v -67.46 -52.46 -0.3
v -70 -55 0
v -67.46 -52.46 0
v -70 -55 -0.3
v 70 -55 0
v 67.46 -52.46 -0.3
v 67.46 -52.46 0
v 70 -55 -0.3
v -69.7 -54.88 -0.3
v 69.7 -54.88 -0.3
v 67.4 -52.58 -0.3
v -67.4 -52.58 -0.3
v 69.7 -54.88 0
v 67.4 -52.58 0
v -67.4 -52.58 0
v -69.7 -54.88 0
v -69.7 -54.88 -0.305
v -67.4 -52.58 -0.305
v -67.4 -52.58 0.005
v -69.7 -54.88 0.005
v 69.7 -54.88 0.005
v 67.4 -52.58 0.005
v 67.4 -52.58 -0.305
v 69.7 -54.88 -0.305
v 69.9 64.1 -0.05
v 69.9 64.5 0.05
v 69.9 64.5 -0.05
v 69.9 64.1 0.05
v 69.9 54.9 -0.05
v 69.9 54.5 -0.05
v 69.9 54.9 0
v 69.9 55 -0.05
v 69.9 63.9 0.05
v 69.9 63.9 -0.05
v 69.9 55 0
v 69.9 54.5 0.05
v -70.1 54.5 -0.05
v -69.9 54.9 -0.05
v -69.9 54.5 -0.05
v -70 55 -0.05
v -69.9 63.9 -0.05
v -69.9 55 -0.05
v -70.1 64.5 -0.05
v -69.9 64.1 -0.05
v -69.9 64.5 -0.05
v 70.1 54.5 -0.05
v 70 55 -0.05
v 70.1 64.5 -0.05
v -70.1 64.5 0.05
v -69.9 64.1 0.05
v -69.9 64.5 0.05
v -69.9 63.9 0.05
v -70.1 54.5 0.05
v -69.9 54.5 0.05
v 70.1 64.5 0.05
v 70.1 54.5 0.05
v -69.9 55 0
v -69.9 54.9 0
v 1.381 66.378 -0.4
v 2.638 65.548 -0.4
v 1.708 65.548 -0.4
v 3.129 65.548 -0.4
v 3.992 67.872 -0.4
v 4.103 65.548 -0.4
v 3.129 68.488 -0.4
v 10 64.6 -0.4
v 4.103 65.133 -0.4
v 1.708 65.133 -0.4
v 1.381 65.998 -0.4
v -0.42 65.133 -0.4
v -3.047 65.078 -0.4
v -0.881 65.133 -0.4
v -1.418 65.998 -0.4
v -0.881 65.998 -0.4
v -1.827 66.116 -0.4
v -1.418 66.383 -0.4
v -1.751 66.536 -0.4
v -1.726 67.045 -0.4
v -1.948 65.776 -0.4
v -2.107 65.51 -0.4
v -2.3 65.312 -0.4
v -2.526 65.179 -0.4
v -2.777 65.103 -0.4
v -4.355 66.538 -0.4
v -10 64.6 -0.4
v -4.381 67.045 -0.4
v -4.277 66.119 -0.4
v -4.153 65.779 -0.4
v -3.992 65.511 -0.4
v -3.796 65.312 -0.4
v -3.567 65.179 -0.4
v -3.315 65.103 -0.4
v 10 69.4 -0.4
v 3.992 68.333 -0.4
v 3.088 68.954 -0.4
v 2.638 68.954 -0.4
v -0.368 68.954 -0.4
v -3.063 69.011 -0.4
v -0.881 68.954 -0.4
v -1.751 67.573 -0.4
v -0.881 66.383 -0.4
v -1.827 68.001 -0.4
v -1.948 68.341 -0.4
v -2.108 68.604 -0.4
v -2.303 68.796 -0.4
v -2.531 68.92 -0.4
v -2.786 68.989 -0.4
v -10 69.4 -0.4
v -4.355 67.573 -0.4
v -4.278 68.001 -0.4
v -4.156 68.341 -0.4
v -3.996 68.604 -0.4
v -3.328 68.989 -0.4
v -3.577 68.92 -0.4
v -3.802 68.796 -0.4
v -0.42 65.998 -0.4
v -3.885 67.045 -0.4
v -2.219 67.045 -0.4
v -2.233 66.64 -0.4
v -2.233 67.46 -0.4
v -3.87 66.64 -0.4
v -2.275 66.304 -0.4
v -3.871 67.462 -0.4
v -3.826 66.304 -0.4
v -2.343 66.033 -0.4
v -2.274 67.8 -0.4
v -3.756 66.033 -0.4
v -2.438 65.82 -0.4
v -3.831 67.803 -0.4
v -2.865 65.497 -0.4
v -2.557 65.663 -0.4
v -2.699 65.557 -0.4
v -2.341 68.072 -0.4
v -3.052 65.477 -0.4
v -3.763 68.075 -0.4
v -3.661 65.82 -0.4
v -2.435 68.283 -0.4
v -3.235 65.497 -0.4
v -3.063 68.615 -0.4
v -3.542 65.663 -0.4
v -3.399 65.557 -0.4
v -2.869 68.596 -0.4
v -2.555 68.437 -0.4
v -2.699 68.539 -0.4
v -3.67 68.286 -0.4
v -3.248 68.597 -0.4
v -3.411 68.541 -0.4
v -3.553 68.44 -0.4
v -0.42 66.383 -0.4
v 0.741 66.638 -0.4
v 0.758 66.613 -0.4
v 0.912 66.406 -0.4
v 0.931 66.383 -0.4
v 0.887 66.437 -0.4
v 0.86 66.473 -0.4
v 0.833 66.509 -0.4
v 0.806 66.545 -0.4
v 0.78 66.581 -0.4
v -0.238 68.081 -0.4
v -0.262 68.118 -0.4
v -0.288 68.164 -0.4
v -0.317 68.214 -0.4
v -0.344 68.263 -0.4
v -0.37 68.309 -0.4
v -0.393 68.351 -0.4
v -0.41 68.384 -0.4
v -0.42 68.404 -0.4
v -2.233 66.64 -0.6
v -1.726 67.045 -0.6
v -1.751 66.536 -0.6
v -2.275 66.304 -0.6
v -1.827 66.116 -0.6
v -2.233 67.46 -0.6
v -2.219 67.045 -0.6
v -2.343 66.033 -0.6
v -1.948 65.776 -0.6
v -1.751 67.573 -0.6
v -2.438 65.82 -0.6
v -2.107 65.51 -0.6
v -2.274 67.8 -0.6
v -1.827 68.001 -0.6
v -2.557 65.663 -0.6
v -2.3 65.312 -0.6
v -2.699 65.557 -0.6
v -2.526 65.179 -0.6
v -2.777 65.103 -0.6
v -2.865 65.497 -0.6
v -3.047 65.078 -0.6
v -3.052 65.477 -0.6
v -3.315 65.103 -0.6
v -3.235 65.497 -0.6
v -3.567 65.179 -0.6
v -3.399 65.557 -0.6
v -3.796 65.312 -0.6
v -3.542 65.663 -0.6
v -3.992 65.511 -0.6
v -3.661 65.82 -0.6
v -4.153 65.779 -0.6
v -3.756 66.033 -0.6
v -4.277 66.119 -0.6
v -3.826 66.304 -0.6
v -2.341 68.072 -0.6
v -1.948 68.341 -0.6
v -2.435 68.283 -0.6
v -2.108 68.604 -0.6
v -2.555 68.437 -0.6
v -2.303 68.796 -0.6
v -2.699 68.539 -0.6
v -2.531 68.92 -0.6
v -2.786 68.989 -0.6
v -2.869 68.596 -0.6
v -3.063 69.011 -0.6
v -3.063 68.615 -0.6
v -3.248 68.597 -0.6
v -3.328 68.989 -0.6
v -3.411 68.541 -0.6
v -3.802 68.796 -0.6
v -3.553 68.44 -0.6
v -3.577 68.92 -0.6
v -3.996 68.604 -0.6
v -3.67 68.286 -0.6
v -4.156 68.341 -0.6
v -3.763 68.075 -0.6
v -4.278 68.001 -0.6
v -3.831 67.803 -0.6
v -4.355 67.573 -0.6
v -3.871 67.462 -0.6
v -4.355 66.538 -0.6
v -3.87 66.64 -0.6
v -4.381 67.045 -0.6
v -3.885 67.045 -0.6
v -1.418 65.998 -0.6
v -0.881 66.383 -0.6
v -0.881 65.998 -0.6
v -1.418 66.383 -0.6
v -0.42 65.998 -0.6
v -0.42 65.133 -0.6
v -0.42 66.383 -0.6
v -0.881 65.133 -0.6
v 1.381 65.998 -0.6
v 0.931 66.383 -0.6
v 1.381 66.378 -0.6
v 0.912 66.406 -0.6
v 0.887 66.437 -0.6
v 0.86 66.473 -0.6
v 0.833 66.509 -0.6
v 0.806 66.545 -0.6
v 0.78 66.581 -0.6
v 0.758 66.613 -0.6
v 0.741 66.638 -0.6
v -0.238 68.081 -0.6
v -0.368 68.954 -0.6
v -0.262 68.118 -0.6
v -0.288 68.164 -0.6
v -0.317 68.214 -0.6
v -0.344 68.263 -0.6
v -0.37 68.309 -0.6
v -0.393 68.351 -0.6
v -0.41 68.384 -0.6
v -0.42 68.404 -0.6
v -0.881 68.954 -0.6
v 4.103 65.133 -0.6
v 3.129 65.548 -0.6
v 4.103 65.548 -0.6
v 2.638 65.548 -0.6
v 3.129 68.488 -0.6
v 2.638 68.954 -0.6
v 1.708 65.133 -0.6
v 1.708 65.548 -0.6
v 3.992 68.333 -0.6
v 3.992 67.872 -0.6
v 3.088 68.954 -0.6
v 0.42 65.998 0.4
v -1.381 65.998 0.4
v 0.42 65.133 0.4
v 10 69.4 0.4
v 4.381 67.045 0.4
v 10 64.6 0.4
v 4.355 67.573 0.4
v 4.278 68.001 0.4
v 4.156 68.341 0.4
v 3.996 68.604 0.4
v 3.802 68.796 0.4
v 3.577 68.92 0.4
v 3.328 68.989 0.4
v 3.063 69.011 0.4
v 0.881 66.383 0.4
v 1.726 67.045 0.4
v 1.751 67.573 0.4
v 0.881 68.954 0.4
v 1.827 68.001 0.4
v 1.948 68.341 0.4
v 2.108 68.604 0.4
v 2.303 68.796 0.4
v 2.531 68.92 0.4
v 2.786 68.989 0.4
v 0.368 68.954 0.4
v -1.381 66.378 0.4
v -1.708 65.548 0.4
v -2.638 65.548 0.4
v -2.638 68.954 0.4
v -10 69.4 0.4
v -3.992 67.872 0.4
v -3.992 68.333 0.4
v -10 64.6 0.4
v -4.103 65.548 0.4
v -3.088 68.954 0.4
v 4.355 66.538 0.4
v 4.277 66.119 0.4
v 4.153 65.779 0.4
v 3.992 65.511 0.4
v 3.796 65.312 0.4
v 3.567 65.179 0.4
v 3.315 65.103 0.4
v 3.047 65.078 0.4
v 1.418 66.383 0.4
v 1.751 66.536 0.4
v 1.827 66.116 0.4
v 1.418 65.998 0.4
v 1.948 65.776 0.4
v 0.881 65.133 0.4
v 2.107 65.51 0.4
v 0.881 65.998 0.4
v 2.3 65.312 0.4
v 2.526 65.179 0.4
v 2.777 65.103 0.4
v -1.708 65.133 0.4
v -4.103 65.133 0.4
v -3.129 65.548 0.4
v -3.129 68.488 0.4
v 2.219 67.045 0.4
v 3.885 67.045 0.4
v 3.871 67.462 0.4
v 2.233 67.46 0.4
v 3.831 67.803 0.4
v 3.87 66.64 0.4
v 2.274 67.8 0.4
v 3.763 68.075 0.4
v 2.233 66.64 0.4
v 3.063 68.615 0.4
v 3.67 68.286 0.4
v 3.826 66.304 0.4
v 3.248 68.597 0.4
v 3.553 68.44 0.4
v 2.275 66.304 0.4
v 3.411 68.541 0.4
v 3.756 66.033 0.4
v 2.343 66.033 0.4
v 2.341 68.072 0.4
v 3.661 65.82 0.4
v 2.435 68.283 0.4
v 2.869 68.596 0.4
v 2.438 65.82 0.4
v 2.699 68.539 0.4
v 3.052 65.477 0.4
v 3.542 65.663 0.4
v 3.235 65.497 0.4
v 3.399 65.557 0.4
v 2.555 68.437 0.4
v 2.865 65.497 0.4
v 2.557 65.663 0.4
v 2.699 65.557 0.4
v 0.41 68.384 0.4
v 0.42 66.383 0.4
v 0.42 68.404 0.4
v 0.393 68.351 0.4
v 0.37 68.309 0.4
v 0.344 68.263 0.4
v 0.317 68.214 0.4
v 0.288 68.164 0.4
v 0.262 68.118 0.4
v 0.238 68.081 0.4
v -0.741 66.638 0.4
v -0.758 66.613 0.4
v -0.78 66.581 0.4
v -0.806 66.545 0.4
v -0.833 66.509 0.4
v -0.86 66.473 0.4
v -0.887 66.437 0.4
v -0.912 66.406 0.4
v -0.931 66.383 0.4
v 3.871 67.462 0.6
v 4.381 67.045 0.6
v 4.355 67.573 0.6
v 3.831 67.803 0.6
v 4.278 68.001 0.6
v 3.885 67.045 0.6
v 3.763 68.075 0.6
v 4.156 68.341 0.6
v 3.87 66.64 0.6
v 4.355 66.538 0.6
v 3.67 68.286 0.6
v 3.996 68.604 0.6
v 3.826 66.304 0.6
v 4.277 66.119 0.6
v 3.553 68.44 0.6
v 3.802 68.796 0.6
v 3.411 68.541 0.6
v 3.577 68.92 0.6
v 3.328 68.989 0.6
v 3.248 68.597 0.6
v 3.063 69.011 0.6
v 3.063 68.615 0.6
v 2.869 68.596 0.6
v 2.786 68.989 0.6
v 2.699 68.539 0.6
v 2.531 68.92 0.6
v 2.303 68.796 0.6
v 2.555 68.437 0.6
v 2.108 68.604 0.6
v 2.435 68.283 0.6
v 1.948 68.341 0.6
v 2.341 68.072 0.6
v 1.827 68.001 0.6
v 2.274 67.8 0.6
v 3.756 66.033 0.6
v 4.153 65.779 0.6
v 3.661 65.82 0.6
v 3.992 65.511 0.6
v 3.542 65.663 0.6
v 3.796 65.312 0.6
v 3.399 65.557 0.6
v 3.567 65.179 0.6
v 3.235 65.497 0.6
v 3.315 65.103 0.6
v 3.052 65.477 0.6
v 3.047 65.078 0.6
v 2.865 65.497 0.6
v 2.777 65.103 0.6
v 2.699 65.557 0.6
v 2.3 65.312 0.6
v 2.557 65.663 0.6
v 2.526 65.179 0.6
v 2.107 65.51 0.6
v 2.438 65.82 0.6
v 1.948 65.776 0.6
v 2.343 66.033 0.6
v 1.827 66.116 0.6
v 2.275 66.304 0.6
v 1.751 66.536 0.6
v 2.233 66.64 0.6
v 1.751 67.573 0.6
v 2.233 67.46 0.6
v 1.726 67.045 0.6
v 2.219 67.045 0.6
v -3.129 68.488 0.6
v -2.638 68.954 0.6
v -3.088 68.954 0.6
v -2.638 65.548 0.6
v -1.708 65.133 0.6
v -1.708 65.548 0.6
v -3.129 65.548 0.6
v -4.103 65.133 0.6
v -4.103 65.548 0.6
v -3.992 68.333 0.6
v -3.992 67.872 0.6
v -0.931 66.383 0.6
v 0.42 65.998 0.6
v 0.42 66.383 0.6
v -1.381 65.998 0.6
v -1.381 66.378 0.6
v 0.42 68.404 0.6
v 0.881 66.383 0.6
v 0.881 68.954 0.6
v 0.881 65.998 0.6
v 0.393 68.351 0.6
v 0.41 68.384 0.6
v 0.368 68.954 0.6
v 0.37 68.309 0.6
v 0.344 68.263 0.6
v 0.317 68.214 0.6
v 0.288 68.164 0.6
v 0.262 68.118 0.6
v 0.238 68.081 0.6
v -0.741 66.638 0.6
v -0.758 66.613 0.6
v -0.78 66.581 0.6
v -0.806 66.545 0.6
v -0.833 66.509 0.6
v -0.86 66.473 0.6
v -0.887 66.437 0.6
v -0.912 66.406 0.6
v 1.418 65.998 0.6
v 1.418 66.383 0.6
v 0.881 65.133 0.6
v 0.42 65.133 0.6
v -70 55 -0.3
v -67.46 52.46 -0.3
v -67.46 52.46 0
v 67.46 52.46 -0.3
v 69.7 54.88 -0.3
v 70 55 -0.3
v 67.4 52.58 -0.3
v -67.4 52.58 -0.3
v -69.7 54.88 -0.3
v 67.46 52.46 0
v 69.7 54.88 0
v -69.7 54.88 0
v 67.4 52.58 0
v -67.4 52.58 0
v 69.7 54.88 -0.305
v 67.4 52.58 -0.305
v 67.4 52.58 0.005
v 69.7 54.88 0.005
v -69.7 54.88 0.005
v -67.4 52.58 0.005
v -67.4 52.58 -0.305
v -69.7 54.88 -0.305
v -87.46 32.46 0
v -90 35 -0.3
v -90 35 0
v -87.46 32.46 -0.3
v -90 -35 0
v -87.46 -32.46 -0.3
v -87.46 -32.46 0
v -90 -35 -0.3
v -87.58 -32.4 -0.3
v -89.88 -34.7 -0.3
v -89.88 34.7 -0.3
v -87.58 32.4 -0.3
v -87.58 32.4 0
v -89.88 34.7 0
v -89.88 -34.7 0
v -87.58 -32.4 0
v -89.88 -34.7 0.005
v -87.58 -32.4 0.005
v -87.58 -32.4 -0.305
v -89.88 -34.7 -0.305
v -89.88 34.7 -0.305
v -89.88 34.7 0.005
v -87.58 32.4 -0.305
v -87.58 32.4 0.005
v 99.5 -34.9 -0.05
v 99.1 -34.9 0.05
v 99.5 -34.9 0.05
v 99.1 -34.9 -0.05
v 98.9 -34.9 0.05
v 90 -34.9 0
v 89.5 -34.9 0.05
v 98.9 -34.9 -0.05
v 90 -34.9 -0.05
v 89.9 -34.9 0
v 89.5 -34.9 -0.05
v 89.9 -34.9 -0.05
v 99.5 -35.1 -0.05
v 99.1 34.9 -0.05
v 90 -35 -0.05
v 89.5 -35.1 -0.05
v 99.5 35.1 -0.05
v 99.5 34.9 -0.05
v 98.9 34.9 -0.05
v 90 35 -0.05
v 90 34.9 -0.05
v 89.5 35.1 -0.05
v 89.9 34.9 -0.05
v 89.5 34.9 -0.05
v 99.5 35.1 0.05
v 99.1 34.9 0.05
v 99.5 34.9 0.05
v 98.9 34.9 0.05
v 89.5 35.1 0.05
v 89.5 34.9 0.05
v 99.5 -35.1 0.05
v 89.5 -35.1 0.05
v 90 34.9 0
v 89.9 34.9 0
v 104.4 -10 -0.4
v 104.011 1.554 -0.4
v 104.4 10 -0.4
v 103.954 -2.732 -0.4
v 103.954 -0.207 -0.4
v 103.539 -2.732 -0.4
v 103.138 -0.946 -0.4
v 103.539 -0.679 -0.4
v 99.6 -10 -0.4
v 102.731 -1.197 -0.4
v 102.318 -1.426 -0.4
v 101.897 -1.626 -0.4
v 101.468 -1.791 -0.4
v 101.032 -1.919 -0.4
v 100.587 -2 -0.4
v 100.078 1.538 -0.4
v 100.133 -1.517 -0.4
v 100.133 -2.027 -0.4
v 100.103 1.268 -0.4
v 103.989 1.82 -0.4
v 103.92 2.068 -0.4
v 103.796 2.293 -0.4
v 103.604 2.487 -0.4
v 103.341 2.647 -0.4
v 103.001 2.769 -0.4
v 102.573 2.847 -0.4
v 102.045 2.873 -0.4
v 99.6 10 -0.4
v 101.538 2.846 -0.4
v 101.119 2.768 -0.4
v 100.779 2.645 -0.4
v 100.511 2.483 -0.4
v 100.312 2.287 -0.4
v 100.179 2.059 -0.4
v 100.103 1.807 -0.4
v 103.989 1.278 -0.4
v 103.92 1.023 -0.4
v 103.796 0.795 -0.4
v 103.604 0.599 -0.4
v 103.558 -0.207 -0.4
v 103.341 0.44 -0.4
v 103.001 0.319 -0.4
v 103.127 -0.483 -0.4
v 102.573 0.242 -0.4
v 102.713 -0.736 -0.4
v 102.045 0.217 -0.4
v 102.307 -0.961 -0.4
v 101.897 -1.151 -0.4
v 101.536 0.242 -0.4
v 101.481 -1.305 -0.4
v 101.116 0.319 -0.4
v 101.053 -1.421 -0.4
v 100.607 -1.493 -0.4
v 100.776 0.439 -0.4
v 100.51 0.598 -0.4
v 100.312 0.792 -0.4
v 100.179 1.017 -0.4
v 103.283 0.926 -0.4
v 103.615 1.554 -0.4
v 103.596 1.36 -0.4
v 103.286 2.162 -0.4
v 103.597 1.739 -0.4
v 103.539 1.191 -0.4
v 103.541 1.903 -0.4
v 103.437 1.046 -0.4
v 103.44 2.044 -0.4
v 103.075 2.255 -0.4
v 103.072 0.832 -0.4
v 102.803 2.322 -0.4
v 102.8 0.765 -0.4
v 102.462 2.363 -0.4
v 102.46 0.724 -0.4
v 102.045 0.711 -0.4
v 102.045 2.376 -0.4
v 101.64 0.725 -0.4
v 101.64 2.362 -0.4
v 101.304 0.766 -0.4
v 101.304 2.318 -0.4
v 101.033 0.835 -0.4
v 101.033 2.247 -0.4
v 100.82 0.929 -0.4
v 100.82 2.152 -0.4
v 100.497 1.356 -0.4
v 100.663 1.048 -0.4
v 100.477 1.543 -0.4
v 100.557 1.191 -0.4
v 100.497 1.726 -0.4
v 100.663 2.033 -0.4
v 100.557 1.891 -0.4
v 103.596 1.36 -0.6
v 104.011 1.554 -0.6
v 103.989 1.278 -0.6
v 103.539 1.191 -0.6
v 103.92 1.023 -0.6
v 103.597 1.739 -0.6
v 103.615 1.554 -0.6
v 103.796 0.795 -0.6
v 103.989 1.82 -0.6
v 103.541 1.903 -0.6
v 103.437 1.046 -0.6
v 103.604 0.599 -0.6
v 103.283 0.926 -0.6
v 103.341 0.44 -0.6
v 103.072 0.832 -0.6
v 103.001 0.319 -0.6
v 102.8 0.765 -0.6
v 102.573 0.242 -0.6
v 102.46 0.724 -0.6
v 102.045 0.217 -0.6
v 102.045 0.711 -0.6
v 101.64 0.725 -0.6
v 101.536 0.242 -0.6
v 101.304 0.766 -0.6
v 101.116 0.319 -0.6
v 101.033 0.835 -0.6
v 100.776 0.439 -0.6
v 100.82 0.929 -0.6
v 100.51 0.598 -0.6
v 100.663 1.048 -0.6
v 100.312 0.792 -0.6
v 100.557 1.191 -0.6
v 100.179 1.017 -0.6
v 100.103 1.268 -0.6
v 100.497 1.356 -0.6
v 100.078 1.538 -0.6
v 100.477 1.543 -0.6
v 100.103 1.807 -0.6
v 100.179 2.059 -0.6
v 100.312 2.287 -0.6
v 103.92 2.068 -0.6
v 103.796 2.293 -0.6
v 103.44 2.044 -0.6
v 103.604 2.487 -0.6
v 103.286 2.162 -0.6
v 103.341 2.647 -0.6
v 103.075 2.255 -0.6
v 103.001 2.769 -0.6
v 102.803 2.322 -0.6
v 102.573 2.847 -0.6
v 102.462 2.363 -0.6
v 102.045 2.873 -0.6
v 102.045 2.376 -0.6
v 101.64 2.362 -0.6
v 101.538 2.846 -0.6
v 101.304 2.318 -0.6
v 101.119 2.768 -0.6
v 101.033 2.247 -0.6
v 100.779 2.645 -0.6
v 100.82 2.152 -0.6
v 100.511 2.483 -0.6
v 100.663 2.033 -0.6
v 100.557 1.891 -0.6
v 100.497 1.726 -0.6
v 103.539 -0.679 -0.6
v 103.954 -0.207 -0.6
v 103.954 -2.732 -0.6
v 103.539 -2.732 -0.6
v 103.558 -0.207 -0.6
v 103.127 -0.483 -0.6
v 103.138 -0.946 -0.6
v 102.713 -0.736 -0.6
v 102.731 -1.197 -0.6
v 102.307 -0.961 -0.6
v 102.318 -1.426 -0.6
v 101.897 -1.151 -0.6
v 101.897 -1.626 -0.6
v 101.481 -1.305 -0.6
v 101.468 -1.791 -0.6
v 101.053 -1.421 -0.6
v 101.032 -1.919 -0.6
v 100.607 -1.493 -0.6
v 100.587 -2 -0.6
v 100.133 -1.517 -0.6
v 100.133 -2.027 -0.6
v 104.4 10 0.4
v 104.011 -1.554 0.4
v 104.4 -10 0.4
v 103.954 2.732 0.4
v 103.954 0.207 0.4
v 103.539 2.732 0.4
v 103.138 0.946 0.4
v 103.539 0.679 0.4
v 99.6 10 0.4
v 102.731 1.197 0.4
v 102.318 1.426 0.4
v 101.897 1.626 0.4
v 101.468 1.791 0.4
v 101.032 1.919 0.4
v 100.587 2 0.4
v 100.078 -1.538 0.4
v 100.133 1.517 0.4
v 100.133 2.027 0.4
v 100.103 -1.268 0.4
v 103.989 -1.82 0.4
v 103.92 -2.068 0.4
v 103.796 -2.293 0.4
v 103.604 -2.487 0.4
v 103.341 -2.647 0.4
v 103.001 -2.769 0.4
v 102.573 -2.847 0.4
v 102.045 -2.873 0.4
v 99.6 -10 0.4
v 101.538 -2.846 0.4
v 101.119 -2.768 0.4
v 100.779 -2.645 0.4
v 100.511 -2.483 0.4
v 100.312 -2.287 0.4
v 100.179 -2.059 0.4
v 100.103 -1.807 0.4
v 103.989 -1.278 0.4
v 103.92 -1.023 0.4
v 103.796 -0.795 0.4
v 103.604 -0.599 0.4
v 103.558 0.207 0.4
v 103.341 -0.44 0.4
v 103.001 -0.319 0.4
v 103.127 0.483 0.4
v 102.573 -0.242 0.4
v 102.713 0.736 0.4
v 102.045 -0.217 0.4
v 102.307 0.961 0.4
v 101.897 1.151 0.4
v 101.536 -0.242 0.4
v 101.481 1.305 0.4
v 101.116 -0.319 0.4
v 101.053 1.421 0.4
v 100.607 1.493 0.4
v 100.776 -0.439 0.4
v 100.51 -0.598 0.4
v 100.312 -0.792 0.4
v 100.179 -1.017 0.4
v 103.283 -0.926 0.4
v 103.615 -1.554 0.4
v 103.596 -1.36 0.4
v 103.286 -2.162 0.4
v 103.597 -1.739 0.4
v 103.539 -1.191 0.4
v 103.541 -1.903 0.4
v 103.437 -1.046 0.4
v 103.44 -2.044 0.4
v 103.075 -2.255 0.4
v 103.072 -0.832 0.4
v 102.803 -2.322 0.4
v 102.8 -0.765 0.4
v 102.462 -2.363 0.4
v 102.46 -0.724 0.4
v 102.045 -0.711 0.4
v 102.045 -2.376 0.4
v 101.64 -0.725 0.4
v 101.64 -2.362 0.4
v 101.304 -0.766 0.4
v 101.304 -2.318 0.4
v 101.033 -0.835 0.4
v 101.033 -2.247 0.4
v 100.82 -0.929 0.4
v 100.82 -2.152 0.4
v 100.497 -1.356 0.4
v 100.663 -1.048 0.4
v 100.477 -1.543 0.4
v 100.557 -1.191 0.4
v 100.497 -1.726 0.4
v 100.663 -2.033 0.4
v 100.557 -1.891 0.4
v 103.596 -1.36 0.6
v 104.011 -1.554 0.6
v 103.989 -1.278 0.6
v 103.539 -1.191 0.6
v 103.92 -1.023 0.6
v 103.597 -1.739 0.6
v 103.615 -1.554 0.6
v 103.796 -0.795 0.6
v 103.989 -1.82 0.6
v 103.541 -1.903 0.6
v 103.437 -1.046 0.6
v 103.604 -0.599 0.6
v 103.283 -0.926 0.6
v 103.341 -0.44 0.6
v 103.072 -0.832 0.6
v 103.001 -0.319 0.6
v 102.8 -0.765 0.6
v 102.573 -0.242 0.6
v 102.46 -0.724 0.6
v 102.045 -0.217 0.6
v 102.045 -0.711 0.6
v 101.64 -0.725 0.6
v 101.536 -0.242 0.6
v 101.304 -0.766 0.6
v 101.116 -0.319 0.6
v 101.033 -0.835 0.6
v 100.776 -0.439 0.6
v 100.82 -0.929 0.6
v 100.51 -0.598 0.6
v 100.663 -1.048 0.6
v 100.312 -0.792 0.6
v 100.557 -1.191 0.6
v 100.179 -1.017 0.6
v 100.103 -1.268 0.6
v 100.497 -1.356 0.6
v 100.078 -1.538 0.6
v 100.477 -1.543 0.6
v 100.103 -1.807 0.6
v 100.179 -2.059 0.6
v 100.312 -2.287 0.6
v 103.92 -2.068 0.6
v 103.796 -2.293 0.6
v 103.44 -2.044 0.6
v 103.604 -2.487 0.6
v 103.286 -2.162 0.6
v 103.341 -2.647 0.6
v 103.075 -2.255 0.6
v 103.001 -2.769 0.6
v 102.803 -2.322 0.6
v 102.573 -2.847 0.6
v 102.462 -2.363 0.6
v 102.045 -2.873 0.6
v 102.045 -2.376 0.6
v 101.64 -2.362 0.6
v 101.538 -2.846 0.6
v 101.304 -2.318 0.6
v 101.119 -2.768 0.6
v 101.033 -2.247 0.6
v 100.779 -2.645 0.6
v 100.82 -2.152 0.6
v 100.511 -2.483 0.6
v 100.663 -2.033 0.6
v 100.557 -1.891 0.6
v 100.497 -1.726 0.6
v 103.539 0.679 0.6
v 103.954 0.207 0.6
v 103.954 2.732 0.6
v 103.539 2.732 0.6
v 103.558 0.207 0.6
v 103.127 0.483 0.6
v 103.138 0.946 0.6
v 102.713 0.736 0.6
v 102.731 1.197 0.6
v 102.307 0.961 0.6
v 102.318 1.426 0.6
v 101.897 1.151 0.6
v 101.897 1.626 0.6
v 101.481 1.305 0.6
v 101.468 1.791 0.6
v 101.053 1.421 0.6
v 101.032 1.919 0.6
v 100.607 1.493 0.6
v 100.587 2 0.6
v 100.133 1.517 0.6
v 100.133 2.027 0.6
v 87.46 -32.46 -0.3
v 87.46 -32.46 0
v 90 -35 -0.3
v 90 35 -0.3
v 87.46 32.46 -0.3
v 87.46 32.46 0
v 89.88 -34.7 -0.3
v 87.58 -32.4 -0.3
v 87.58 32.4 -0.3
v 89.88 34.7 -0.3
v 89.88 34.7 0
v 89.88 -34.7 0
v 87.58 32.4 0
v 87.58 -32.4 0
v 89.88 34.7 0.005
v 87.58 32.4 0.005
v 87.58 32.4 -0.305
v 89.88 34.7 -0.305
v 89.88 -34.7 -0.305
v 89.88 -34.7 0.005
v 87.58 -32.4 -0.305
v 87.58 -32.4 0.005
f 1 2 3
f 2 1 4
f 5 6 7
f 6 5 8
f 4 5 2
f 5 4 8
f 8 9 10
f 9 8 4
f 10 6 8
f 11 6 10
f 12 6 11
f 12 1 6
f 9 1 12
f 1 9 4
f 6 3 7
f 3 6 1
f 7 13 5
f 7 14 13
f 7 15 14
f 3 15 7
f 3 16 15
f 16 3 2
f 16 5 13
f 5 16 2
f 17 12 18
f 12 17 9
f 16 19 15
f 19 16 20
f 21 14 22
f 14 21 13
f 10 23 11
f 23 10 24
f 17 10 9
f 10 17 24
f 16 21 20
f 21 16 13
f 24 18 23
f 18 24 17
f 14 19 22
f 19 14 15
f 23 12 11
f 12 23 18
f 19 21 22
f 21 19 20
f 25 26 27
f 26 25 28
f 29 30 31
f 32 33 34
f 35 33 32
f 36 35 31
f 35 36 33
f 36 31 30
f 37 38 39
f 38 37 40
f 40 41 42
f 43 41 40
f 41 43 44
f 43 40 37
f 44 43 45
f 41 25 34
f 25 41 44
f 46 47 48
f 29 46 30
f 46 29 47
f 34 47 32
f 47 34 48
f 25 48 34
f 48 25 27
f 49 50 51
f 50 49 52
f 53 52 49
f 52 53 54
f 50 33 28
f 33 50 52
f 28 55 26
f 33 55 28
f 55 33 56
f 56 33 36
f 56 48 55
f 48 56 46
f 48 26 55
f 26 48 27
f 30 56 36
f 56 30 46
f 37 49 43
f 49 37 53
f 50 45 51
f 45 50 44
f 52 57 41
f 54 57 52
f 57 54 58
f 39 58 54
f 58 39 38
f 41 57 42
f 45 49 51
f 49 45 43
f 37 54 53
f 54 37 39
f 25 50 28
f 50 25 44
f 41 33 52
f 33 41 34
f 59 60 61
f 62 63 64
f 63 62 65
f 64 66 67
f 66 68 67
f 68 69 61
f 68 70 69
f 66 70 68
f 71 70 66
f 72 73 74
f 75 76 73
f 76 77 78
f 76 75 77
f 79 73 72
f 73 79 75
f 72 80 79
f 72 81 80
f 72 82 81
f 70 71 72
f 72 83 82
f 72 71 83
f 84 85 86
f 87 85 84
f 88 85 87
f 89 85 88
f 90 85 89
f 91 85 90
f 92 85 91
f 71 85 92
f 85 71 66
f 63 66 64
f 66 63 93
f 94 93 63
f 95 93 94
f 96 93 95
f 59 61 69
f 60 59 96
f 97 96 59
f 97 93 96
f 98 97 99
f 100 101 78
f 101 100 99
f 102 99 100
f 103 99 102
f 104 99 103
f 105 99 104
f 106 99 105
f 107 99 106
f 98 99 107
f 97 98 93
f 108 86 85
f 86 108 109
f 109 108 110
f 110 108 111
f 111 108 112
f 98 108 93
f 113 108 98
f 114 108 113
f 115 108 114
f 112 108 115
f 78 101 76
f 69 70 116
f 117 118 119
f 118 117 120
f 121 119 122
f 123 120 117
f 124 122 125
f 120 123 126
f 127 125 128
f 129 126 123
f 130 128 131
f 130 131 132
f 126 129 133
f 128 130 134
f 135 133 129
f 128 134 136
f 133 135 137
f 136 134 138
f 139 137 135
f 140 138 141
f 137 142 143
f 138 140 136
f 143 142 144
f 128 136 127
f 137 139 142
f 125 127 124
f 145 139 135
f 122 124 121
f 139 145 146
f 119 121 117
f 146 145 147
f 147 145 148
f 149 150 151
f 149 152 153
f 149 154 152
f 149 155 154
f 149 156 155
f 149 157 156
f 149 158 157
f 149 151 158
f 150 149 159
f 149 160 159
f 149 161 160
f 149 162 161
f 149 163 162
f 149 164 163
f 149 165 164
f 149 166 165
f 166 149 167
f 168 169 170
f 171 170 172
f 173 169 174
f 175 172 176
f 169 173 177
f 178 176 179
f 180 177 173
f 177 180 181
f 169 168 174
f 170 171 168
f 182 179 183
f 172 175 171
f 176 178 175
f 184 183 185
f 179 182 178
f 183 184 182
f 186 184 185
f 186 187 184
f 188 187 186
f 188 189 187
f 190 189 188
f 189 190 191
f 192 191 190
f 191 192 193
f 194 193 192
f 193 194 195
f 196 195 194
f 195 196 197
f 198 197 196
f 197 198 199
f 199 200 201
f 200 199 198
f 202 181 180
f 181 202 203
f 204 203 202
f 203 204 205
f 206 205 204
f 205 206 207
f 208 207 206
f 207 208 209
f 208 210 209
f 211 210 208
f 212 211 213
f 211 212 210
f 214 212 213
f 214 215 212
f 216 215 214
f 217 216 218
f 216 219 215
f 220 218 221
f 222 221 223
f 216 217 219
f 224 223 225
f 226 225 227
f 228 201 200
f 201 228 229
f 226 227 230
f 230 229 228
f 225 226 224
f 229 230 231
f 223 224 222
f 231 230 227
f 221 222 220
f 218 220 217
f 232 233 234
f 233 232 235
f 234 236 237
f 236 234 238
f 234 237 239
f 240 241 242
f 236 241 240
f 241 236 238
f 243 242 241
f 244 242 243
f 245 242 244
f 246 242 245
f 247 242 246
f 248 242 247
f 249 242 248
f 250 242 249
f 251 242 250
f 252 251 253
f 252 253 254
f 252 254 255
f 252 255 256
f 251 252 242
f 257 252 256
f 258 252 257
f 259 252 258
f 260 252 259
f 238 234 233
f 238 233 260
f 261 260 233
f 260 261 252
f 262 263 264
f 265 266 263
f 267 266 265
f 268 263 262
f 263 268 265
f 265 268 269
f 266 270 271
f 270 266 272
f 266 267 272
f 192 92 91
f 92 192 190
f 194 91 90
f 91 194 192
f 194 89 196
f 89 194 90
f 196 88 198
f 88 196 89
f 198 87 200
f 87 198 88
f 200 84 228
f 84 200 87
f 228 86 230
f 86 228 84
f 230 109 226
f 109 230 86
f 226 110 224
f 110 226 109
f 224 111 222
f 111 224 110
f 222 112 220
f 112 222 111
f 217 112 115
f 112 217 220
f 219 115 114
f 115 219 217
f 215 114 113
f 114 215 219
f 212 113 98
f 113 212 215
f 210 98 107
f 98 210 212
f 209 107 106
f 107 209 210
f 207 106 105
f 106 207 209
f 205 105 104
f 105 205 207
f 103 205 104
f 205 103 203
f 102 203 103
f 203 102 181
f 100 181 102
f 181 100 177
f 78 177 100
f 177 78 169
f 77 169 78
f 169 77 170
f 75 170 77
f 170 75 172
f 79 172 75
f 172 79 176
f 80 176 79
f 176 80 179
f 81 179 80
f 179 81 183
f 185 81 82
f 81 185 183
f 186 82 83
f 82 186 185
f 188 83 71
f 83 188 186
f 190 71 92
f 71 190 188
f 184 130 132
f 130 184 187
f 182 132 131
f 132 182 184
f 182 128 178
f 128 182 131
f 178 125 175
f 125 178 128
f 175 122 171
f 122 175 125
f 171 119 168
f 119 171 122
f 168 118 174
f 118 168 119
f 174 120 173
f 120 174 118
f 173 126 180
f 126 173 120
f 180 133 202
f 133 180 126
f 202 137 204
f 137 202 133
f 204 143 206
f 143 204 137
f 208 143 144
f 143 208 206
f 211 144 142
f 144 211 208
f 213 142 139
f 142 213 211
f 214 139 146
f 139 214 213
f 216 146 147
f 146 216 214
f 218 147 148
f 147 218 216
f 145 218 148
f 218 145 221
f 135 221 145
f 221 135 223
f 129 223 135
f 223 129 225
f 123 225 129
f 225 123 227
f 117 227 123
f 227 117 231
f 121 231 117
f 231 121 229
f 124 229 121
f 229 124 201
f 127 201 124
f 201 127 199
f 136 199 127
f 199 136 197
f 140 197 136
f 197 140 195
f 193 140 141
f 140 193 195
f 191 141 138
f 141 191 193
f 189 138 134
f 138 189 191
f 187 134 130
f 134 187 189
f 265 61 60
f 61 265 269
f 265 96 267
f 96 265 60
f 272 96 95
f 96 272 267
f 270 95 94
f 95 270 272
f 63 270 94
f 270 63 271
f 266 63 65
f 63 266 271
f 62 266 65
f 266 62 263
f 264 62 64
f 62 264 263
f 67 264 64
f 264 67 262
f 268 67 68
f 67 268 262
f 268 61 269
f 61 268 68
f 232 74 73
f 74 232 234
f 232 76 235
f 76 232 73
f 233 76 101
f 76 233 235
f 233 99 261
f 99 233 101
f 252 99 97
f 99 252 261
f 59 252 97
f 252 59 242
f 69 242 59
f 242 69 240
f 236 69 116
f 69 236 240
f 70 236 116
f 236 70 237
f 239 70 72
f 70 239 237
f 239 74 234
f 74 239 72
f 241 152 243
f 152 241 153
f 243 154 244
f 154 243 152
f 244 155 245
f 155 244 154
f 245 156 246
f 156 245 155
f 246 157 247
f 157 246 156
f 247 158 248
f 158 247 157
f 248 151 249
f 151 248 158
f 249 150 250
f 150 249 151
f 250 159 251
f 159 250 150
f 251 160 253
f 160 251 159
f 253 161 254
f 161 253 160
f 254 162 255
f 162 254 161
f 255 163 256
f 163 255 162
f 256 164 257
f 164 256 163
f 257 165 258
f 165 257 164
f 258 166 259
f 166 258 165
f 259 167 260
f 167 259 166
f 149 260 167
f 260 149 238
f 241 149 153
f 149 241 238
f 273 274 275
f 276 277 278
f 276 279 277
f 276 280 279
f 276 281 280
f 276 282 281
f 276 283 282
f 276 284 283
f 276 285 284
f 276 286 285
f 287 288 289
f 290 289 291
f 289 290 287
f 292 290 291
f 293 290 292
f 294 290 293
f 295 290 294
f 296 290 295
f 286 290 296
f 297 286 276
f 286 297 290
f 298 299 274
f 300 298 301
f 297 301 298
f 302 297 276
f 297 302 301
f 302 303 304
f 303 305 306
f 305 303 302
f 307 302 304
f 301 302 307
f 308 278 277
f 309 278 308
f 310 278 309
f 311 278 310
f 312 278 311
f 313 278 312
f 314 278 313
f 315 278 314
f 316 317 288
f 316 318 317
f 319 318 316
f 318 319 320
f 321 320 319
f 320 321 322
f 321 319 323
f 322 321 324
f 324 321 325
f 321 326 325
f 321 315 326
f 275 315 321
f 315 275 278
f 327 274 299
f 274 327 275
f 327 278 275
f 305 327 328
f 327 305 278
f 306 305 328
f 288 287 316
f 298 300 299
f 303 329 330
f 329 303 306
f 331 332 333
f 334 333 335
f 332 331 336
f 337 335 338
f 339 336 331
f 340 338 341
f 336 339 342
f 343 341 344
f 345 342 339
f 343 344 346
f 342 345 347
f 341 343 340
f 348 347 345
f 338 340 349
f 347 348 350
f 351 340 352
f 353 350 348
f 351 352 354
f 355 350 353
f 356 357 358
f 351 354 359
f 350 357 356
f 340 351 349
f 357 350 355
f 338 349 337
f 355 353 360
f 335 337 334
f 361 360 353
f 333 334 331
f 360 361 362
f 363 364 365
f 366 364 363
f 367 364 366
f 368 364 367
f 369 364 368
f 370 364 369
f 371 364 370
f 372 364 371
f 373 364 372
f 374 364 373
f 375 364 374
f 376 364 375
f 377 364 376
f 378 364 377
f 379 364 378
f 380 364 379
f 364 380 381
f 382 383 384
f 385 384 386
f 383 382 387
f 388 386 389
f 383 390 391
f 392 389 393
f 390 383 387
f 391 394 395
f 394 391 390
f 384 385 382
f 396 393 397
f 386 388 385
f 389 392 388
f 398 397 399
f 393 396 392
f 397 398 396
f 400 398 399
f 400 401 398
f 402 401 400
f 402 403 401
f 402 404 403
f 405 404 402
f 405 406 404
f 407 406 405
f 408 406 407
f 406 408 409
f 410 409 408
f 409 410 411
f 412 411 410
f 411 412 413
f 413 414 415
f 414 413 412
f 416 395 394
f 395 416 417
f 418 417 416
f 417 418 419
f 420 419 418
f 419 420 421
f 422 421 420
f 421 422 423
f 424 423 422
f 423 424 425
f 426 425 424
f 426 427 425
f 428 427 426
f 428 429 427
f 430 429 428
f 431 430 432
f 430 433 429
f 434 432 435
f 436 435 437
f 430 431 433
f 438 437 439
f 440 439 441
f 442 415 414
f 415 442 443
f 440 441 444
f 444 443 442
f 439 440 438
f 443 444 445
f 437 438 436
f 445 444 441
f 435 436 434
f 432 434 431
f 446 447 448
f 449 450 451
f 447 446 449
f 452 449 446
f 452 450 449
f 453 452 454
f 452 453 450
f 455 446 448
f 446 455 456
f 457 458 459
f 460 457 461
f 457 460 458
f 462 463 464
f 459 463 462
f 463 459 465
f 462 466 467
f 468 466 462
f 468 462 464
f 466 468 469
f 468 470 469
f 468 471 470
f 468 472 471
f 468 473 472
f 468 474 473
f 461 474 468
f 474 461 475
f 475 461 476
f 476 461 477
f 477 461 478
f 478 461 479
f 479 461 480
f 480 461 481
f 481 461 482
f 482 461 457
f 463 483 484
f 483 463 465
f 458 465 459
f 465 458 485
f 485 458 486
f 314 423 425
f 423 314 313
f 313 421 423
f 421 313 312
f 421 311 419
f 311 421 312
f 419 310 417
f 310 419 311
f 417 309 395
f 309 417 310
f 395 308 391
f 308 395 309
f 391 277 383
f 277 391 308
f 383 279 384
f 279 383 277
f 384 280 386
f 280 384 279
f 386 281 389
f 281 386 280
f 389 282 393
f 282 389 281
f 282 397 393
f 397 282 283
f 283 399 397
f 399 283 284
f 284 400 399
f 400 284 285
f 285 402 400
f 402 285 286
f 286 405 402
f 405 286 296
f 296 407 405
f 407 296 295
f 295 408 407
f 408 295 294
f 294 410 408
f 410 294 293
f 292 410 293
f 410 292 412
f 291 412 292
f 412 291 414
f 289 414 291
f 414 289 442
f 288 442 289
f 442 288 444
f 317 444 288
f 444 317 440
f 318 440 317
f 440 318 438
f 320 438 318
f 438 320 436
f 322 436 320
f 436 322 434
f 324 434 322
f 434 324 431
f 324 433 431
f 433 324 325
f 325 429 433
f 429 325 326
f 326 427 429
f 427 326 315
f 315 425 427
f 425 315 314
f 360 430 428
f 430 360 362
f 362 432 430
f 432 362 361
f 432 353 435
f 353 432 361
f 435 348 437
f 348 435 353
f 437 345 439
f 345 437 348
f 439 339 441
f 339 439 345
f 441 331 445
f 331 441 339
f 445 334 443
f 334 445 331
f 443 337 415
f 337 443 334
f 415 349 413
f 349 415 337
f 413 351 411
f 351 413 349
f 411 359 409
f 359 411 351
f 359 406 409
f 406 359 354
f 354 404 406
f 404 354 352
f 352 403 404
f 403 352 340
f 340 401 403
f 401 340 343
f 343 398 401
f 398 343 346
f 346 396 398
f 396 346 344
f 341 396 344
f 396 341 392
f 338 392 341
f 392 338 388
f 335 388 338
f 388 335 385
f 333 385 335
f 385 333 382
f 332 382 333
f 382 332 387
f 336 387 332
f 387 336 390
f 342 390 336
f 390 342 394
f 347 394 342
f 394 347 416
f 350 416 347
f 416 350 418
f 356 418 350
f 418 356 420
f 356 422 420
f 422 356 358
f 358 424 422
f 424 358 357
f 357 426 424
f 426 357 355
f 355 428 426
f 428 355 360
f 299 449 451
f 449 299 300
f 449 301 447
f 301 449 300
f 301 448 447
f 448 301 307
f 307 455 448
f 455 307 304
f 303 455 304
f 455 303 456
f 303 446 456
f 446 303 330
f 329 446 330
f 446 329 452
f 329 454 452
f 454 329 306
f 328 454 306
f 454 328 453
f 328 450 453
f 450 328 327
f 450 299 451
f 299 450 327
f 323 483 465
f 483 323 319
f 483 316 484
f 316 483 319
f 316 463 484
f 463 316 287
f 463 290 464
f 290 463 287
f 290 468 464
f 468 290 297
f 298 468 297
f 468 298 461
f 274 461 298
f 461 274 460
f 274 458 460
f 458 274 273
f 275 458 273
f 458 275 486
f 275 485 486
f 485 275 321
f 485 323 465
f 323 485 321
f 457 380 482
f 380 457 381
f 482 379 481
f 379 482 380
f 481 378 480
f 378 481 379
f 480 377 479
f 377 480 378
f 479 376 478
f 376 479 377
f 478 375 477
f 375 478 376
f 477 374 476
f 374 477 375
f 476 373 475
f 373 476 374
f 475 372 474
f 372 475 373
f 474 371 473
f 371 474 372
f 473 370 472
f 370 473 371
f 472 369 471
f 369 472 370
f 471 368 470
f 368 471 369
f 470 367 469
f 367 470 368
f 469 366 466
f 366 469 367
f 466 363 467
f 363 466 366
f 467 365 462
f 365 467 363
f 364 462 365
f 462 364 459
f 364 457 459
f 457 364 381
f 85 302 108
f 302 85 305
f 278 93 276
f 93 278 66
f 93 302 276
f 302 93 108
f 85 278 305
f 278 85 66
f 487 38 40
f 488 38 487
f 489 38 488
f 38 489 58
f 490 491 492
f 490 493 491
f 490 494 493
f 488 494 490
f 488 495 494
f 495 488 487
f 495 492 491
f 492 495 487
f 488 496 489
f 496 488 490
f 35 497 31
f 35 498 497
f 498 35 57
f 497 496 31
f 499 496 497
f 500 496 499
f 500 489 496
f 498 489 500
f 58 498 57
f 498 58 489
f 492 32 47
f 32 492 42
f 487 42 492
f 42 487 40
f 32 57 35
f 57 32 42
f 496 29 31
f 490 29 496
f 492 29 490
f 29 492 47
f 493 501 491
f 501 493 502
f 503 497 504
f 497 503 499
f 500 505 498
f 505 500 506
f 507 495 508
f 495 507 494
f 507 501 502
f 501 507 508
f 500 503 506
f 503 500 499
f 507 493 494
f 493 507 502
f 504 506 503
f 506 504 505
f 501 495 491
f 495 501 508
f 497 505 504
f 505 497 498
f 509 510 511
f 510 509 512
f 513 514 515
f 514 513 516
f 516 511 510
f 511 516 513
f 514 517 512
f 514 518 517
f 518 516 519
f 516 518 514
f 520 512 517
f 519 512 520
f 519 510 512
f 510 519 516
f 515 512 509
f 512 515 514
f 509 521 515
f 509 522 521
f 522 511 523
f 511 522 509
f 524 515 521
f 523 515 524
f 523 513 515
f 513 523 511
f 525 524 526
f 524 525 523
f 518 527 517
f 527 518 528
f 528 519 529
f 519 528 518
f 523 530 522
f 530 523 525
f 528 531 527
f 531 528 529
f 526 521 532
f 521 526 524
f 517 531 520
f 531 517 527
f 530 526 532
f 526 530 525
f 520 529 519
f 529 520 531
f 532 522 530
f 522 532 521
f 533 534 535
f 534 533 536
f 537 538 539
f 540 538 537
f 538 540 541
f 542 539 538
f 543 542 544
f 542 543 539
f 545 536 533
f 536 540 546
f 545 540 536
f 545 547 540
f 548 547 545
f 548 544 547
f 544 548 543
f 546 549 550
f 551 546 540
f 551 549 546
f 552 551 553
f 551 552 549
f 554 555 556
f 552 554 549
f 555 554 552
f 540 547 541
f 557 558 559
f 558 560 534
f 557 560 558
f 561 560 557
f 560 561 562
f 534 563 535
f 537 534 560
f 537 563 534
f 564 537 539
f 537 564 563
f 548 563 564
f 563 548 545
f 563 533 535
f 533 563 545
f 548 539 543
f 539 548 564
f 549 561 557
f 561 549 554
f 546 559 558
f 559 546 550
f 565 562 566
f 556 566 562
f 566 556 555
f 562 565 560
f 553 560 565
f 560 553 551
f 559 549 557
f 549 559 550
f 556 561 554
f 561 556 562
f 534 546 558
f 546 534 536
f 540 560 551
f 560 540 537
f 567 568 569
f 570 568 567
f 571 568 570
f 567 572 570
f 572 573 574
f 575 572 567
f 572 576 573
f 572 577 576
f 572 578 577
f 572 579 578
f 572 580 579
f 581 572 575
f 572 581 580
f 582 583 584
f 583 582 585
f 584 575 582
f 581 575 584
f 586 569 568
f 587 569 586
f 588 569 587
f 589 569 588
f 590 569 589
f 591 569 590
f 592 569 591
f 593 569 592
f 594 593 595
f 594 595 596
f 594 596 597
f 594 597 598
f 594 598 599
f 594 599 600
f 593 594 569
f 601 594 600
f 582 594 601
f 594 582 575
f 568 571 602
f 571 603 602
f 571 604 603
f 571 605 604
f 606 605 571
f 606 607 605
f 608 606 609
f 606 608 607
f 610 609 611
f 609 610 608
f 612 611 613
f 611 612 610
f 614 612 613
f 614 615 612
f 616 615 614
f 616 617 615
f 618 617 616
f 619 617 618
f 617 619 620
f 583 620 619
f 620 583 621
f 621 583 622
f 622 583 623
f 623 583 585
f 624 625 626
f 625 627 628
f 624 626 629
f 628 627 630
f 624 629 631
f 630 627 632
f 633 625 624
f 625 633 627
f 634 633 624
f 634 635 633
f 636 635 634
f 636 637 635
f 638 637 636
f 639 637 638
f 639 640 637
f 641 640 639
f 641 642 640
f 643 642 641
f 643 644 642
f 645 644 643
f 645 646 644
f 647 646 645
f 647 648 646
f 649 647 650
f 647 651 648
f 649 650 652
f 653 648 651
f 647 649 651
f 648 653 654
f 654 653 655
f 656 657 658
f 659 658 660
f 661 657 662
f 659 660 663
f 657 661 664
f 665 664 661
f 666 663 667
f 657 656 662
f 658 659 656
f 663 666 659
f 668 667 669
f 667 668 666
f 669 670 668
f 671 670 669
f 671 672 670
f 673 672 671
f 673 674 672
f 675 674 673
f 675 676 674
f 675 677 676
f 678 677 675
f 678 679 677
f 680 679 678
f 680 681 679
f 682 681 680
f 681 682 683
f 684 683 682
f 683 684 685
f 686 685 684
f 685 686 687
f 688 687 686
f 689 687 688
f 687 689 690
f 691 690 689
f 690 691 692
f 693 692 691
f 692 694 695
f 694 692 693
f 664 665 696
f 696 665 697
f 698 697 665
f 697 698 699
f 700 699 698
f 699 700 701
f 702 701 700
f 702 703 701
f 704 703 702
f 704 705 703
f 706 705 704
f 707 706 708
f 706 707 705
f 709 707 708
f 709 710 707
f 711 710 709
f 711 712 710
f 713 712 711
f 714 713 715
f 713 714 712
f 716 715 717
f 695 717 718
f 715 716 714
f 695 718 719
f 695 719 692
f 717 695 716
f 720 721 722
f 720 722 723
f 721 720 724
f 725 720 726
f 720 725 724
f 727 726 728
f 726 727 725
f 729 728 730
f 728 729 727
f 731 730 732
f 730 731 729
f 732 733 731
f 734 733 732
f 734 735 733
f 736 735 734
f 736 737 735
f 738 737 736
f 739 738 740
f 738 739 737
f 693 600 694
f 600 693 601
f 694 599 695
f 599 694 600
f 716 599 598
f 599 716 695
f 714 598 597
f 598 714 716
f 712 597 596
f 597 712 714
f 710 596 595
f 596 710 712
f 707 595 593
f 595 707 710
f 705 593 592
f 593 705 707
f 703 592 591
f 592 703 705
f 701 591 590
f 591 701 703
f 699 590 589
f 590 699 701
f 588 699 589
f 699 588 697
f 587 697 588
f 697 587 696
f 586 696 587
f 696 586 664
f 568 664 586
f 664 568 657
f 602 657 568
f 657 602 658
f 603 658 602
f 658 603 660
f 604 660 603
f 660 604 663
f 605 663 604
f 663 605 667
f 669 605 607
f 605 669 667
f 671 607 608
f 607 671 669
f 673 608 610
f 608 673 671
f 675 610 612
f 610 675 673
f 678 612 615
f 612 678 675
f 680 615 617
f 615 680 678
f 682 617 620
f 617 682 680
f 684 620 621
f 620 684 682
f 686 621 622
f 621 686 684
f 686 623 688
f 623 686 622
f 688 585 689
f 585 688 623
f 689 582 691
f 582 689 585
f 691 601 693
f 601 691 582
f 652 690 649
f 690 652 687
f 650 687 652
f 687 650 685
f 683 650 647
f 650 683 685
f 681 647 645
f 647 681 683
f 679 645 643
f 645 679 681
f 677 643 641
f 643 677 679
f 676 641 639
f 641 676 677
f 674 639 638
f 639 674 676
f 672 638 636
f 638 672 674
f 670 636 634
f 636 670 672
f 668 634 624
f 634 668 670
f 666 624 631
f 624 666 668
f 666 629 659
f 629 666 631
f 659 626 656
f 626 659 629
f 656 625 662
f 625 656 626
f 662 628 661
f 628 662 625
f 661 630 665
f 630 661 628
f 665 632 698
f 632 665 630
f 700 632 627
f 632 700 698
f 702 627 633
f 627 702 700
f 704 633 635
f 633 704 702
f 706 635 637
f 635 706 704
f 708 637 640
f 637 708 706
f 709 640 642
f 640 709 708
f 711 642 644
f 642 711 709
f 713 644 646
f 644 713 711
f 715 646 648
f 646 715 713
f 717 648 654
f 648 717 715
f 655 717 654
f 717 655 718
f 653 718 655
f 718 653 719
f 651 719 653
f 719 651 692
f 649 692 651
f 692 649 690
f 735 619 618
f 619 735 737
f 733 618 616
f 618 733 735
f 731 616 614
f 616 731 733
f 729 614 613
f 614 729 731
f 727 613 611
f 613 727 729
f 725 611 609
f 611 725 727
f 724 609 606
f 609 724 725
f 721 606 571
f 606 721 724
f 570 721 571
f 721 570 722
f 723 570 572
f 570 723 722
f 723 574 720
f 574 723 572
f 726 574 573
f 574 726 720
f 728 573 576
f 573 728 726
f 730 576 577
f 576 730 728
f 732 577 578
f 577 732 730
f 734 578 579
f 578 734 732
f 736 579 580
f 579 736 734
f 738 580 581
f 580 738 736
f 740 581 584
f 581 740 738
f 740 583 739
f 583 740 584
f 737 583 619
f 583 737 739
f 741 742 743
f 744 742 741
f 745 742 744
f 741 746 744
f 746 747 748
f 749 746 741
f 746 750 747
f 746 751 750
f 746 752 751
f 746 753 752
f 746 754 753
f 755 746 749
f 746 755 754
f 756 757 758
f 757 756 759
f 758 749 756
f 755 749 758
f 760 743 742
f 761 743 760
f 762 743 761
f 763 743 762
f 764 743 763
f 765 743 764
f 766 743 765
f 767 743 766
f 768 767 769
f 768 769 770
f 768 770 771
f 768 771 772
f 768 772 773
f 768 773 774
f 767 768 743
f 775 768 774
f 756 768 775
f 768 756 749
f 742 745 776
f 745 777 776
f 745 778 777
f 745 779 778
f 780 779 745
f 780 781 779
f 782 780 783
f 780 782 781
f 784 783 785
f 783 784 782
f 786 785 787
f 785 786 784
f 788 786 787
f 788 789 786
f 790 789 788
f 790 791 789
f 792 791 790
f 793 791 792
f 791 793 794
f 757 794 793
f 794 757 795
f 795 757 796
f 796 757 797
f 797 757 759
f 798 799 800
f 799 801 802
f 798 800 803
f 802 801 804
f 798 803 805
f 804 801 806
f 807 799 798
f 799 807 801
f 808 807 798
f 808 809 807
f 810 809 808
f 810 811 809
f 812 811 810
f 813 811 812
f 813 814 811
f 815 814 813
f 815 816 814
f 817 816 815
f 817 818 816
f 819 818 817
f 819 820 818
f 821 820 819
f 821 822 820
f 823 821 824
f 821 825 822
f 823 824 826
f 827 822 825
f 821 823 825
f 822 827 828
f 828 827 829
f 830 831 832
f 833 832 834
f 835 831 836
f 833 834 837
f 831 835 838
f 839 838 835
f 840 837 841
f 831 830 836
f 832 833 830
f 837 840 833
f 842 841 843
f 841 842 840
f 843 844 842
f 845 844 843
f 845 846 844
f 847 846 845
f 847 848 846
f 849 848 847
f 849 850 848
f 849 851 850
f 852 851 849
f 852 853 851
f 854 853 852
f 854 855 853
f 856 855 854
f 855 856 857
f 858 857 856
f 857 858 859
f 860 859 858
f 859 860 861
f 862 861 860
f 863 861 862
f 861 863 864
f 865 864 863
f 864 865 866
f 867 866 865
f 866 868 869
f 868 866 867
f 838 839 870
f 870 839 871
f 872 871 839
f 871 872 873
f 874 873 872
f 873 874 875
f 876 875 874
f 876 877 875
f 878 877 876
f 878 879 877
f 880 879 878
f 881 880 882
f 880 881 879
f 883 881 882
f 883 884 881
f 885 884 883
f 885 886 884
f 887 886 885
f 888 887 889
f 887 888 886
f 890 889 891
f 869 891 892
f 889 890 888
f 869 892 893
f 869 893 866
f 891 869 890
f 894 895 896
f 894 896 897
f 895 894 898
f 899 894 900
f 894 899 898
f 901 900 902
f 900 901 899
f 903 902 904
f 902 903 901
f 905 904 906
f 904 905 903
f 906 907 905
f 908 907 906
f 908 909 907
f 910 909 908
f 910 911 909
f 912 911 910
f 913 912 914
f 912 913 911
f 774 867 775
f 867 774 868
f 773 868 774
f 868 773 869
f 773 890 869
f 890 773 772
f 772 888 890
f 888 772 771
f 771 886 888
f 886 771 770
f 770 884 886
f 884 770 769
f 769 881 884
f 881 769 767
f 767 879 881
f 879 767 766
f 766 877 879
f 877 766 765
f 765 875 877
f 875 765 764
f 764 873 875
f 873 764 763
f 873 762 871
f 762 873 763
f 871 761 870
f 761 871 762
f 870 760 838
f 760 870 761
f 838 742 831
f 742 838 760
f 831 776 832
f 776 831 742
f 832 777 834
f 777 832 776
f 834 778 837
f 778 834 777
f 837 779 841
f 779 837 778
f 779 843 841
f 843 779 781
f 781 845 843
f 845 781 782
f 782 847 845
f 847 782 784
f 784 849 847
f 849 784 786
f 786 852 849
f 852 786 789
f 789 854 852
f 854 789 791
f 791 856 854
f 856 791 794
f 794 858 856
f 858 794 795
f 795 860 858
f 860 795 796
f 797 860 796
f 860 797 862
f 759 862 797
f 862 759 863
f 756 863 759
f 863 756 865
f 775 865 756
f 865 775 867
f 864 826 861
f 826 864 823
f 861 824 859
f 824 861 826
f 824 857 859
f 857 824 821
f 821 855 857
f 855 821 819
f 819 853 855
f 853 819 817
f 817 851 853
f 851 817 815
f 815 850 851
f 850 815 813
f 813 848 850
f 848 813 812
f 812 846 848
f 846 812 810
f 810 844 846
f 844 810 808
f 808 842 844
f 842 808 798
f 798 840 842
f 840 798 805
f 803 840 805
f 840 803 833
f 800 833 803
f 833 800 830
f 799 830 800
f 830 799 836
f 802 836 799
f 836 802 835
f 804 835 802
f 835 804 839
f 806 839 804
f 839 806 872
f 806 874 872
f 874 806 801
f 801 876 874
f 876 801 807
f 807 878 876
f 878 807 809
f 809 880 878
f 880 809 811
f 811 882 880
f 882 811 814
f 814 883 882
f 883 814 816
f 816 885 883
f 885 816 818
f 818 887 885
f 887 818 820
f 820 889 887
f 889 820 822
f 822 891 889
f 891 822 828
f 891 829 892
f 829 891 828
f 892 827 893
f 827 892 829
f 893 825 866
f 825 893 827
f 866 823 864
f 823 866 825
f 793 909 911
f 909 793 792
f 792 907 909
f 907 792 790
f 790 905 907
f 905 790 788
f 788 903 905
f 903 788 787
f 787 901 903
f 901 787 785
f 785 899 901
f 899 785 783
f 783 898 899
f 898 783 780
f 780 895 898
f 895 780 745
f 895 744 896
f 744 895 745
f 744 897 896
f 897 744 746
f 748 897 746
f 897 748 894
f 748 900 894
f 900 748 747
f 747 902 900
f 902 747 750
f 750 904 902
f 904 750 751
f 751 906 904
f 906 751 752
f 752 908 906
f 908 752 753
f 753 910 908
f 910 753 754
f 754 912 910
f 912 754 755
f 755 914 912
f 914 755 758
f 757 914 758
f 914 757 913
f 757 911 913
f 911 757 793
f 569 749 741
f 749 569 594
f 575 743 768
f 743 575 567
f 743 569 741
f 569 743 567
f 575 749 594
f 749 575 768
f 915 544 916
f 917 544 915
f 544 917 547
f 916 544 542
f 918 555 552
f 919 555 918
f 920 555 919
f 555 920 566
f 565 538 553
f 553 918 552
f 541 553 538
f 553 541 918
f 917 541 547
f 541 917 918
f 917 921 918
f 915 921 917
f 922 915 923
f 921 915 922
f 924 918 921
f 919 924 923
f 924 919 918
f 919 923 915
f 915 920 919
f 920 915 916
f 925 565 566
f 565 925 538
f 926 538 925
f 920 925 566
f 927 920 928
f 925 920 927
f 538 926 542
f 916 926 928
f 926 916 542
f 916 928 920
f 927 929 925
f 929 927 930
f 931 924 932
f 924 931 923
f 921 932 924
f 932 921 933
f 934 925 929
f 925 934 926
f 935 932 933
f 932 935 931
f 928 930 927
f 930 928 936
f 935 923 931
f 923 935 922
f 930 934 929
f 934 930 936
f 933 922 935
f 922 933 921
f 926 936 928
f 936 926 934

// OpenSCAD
// file: hdim.scad
module hdim(
  x1 = 10, 
  x2 = 200, 
  y = 10, 
  dimline_lenght = 9.0,
  scaling = 1.0) 
{
    dimline_overlap = scaling * 0.5;
    dimline_width = scaling * 0.2;
    text_size = scaling * 4;
    tmp = 2*dimline_overlap+text_size/2;
    scaled_dl_len = scaling * dimline_lenght;
    text_pos = scaled_dl_len>0 ? tmp : -tmp; 
    dimline_abs = scaled_dl_len>0 ? scaled_dl_len : -scaled_dl_len;
    
    color([146/255, 154/255, 255/255, 0.9])
    {
        translate([x1,y-scaled_dl_len/2,0]) 
            cube([dimline_width, 
                dimline_abs + 2*dimline_overlap,
                dimline_width/2], 
                center=true);
                
        translate([x2,y-scaled_dl_len/2,0]) 
            cube([dimline_width, 
                dimline_abs + 2*dimline_overlap,
                dimline_width/2], 
                center=true);

        translate([(x1+x2)/2,y-scaled_dl_len,0]) 
            cube([x2-x1, 
                dimline_width,
                dimline_width/2], 
                center=true);
    }
        
    translate([(x1+x2)/2,y-scaled_dl_len-text_pos,0]) 
    {
        color("WhiteSmoke")
        cube([text_size * 5, 1.2*text_size, 0.8*scaling], center=true);
        
        color([0,0,0,1])
        {
            translate([0,0,0.4*scaling])
            linear_extrude(0.2*scaling)
            text(str(0.1*round((x2-x1)*10)), size = text_size, 
                halign = "center",valign = "center");
            translate([0,0,-0.4*scaling])
            rotate([0,180,0])
            linear_extrude(0.2*scaling)
            text(str(0.1*round((x2-x1)*10)), size = text_size, 
                halign = "center",valign = "center");
        }
    }
}

hdim();
// main file
use <hdim.scad> 

default_bar_diam = 3.8;
default_bar_t  = 0.3;

module rectangularframe(length = 140, width = 70, 
    bar_diam = default_bar_diam, 
    bar_t = default_bar_t, 
    explode=false, 
    c1 = [0.5,0.28,0.19, 1.0], 
    c2 = [0.8,0.30,0.29, 1.0])
{
    d = explode ? 20 : 0;
      
    rotate([0,180,0])
    {
        translate([-length/2,-d-width/2,0]) 
        
        rectangularmetal(length, bar_diam, bar_t, c2);
        //if (explode) {
            hdim(-length/2, length/2, width/2+d, -9);
        //}
        
        translate([length/2,width/2+d,0]) 
        rotate([0,0,180]) 
        rectangularmetal(length, bar_diam, bar_t, c1);
        
        translate([d+length/2,-width/2,0]) 
        rotate([0,0,90]) rectangularmetal(width, bar_diam, bar_t, c2);
        //if (explode) {
            rotate([0,0,90]) 
            hdim(-width/2, width/2, length/2+d, -9);
        //}
        
        translate([-length/2-d,width/2,0]) 
        rotate([0,0,-90])
        rectangularmetal(width, bar_diam, bar_t, c1);
    }
}        

module rectangularmetal(length, 
    bar_diam = default_bar_diam, 
    bar_t = default_bar_t,
    c = [0.5,0.28,0.19, 1.0])
{
  line_w = 0.12;

  p=[[0,0],
      [bar_diam, bar_diam],
      [length-bar_diam, bar_diam],
      [length, 0], [0,0]];

  p2=[[line_w*2.5,line_w],
    [bar_diam+line_w*0.5, bar_diam-line_w],
    [length-bar_diam-line_w*0.5, bar_diam-line_w],
    [length-line_w*2.5, line_w], [line_w*2.5,line_w]];

  small = 0.01;

  color(c) 
  linear_extrude(bar_t) 
  polygon(p);
      
  translate([0,0,-small/2])
  color("AliceBlue") 
  linear_extrude(bar_t+small) 
  polygon(p2);
}   


rectangularframe(explode=true, bar_diam = 2.54, bar_t=0.3);
